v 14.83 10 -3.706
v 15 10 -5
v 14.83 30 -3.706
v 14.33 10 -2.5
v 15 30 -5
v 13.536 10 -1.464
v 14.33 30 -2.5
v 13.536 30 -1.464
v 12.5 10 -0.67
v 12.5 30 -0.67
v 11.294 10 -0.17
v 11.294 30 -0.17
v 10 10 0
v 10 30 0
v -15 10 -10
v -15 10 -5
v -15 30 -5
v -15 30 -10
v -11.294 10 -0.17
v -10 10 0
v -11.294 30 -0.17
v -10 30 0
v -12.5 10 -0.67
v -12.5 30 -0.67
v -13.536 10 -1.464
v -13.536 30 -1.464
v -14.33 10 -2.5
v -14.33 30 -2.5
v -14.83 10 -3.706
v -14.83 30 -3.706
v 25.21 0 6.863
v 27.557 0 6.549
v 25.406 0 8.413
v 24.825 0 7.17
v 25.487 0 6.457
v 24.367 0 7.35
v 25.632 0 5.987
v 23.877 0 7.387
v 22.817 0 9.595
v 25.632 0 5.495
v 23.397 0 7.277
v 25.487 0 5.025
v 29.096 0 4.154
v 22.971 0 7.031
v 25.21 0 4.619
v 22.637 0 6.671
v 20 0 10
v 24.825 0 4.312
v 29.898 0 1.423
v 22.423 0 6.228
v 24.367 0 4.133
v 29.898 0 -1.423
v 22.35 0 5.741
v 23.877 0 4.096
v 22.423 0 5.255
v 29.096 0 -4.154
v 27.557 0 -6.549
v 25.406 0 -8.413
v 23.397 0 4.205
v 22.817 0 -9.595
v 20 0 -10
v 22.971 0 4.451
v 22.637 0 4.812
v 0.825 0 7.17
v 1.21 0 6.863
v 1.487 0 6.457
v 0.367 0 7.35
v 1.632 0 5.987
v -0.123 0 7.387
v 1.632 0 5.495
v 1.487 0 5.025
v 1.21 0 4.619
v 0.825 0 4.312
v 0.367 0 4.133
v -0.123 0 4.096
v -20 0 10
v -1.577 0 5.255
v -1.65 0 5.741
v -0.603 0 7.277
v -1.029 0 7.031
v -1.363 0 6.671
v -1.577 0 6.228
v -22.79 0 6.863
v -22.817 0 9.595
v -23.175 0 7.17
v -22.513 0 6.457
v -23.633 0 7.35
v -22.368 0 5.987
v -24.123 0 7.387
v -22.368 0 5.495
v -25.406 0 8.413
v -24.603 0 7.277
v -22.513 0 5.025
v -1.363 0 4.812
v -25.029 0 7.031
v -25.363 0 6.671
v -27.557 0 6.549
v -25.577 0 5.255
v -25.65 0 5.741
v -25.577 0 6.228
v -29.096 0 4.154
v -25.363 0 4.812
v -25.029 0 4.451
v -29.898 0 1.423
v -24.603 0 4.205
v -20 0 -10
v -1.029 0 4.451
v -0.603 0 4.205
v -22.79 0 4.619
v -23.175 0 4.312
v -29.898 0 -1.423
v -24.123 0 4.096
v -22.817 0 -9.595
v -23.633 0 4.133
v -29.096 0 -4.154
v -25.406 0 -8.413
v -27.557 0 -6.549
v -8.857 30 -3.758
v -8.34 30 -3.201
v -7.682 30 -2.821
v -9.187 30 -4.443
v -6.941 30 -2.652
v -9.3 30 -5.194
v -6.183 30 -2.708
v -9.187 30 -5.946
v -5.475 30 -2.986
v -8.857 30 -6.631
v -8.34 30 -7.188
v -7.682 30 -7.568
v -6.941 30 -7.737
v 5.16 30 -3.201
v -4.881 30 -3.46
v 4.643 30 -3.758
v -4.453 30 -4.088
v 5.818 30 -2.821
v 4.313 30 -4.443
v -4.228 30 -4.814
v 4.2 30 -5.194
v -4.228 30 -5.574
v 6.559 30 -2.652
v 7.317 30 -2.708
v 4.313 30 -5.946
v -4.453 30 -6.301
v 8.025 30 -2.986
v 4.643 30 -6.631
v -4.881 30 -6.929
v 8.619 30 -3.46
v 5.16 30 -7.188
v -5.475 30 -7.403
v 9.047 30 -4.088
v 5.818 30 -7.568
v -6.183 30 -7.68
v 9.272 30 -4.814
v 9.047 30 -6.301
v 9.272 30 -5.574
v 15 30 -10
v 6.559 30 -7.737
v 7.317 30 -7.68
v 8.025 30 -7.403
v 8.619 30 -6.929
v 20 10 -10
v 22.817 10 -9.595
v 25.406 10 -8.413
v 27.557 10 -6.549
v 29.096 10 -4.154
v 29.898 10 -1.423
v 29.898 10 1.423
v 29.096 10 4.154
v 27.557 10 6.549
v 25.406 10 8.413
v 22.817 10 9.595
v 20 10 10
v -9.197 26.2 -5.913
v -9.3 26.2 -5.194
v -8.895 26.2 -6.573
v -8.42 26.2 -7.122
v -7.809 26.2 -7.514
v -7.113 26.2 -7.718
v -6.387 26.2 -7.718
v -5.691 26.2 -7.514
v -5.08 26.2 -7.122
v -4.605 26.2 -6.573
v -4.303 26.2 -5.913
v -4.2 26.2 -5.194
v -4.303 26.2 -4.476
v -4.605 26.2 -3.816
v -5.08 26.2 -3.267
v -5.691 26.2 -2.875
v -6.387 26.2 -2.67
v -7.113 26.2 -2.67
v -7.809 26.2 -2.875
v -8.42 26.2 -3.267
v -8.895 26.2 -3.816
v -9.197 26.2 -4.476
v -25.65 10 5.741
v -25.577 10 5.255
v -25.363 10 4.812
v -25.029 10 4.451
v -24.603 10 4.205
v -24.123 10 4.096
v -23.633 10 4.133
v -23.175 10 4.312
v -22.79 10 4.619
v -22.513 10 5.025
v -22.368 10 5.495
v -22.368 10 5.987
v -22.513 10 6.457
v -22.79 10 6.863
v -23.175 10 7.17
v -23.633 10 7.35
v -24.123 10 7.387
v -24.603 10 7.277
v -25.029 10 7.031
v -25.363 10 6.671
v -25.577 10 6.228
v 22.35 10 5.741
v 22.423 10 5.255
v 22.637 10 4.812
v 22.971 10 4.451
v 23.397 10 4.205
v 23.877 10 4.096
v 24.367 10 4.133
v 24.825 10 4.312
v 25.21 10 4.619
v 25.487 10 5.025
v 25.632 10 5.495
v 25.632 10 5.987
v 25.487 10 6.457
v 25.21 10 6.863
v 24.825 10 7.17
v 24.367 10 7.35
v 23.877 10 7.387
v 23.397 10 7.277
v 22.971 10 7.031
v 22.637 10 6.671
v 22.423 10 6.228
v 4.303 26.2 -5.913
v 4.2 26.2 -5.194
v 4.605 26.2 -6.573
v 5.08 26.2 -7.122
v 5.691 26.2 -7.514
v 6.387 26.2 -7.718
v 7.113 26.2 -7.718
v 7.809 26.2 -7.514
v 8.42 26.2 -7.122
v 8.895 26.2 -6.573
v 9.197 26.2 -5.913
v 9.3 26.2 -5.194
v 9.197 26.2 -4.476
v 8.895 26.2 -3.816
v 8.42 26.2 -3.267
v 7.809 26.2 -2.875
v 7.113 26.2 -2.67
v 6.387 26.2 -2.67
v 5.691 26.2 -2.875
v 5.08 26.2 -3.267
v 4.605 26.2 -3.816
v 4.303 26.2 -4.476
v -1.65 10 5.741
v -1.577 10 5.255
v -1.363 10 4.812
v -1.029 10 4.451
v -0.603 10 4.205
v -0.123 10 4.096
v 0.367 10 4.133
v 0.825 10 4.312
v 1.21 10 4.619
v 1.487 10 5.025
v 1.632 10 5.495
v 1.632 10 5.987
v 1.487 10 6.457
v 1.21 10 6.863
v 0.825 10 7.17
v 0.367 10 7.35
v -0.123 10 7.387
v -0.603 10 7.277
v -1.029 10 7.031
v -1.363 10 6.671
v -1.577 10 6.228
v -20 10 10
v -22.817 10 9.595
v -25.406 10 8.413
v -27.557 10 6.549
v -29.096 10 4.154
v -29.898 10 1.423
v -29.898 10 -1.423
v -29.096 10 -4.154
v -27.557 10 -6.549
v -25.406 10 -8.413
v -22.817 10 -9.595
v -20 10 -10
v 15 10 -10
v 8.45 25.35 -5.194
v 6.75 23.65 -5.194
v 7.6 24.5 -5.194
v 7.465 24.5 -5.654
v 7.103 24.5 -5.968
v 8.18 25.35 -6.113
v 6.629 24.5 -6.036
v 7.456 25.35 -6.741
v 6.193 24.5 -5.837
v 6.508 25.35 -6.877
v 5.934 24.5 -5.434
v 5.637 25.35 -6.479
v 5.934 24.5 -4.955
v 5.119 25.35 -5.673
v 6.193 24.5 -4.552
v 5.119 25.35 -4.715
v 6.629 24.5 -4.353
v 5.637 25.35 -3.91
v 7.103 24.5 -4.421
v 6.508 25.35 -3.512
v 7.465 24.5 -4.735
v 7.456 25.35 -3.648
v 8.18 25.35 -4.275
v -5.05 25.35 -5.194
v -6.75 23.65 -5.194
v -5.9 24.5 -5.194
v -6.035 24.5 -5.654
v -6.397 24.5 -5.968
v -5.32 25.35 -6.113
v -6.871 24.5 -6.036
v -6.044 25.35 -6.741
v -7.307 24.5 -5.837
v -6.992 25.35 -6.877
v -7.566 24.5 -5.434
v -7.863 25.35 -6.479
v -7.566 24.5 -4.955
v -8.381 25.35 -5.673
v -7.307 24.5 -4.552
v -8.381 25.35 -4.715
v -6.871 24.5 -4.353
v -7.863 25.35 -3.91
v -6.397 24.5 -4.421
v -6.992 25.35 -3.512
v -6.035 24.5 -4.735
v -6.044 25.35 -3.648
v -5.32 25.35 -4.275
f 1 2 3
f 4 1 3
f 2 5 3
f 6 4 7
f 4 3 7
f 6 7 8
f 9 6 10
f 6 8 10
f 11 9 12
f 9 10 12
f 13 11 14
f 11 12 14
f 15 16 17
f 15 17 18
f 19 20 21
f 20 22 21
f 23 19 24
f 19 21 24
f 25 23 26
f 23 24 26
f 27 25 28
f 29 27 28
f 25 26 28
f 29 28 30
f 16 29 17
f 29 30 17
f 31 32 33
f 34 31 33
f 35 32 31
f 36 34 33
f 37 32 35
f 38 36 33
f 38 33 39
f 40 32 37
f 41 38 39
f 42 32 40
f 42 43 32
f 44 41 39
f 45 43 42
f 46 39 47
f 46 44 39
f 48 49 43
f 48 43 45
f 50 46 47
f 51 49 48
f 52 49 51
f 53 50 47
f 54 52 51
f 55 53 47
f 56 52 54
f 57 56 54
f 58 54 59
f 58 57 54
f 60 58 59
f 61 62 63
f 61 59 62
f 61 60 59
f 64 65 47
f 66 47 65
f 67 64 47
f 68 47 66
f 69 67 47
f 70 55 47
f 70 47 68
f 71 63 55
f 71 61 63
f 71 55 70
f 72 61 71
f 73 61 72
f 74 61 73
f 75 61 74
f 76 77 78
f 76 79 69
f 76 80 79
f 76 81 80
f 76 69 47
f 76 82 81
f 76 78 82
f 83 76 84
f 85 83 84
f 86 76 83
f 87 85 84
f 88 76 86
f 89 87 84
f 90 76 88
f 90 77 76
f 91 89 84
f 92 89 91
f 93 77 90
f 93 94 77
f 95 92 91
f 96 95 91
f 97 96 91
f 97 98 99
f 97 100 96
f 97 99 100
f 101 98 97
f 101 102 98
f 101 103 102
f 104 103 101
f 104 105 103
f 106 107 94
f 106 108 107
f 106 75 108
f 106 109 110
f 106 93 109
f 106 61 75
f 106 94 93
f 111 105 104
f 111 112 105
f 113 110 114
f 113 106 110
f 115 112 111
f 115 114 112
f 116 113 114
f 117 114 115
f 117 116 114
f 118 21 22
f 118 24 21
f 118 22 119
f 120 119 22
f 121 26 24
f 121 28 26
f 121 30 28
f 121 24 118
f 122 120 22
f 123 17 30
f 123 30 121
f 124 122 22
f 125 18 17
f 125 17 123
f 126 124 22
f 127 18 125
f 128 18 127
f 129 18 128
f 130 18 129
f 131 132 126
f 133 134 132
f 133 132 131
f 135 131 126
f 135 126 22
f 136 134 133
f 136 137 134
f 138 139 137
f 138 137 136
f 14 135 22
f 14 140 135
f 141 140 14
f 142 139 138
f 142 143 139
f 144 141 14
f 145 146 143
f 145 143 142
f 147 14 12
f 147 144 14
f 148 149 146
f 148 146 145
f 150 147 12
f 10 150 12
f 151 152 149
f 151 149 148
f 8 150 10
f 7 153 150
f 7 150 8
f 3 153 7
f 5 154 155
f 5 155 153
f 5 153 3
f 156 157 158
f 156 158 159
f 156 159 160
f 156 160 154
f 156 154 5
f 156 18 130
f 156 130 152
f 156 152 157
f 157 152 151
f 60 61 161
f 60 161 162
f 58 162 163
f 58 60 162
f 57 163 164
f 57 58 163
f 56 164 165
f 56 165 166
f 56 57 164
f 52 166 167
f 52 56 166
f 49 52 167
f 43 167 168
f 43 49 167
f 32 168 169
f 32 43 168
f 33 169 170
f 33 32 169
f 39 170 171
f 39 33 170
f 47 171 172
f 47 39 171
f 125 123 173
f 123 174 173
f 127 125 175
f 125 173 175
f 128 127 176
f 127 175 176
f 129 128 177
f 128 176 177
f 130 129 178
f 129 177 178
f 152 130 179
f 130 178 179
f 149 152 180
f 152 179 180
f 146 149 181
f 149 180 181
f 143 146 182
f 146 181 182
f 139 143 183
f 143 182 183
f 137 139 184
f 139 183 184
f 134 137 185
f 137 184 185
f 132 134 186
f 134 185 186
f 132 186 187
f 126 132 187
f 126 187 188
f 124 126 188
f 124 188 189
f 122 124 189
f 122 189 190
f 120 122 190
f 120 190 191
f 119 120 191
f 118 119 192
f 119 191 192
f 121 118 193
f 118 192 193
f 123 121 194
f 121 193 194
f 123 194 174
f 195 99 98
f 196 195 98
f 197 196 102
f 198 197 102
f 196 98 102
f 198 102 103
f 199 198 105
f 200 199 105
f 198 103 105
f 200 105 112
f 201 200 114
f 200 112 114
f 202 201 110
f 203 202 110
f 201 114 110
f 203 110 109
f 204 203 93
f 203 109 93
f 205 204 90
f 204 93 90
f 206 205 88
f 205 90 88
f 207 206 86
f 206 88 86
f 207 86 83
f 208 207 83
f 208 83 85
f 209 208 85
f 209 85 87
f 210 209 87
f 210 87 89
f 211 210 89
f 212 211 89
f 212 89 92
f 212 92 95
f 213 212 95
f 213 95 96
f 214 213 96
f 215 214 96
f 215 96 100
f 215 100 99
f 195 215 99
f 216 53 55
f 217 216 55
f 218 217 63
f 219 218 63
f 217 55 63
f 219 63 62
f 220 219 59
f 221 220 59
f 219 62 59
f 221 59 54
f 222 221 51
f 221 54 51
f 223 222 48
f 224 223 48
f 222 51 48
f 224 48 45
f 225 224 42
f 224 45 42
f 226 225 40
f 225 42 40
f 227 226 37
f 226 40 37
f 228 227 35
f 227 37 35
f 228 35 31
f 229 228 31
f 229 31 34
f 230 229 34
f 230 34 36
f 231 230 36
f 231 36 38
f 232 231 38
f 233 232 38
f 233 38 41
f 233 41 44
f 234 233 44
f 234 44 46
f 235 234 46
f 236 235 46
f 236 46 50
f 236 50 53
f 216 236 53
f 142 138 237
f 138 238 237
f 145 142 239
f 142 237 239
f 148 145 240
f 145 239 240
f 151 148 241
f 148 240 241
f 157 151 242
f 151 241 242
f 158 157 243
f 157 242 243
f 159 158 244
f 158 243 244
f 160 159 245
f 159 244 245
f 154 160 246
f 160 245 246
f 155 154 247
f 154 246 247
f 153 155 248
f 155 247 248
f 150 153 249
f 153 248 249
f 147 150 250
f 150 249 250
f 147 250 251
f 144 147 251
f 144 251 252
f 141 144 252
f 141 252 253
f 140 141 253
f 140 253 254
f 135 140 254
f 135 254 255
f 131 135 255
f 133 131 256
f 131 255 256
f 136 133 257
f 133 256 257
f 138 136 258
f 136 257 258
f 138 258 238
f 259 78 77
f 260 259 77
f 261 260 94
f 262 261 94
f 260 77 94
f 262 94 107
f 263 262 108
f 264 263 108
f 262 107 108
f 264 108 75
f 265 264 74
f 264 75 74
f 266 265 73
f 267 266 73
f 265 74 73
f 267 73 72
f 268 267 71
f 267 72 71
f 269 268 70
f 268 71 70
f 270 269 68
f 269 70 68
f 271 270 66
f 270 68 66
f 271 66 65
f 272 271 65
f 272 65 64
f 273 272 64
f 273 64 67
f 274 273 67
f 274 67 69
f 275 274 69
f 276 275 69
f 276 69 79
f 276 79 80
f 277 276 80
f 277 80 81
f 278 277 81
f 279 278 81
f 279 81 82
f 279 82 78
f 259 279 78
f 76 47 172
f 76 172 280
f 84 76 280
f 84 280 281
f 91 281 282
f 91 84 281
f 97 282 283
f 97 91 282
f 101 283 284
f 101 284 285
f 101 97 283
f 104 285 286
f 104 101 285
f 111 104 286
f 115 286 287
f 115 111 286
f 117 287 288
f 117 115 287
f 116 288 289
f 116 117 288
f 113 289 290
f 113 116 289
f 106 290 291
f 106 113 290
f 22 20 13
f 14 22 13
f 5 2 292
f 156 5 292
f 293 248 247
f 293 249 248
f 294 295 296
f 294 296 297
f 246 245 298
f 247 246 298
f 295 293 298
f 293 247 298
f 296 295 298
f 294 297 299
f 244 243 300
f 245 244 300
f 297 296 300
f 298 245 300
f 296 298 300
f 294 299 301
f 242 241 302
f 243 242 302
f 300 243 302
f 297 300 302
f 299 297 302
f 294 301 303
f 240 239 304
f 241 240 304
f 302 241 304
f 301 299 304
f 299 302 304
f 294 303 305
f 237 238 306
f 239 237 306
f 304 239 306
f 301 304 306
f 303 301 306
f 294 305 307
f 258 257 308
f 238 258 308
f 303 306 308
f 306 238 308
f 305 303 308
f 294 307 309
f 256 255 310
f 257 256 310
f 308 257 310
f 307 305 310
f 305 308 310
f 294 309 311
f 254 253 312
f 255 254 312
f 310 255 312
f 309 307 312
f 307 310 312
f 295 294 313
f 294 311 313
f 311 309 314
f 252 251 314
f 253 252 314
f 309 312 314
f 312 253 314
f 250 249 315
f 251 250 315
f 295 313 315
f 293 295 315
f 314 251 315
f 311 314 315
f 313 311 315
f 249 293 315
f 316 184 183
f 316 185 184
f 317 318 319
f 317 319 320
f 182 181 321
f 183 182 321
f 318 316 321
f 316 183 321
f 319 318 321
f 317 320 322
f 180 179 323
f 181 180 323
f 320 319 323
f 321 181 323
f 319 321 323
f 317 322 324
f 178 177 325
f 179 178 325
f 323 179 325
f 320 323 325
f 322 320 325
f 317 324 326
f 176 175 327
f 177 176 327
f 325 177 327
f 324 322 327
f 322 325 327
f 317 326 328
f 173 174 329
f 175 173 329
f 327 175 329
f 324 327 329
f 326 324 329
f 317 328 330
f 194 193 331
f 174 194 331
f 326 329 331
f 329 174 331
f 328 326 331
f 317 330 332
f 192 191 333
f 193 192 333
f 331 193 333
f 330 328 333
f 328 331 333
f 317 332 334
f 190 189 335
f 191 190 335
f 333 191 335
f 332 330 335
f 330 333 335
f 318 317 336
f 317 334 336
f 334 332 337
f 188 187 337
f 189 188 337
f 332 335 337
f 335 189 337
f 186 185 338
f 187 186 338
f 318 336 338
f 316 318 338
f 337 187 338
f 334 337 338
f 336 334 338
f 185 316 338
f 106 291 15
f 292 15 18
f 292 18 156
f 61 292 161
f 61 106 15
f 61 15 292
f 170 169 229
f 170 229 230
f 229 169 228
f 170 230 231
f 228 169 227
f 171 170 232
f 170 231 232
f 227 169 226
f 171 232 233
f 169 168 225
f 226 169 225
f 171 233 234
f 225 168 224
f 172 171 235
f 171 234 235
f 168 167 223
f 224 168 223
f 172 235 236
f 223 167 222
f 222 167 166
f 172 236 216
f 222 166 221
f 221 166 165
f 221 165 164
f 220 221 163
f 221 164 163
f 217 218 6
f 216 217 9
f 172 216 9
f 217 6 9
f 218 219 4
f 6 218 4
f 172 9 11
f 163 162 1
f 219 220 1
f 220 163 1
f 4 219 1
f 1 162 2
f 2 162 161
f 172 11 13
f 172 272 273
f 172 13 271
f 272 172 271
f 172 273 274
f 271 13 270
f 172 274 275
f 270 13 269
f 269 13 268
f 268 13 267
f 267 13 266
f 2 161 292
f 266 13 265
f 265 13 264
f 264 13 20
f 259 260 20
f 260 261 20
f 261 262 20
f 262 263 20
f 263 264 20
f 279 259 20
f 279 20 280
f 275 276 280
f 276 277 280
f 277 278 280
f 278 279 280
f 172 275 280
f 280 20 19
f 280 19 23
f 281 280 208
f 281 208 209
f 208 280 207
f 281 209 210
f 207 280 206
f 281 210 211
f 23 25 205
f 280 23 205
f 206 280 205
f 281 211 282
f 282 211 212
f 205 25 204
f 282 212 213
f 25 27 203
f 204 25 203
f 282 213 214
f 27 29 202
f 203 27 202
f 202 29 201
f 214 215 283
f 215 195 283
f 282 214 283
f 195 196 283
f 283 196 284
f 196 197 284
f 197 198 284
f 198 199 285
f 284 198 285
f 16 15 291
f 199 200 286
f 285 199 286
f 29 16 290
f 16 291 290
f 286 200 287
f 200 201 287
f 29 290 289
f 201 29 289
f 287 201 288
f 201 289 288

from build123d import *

# Parameters (mm, degrees)
BOSS_EXTRUDE1_DEPTH         = 10
TAP_DRILL_FOR_M4X0_7_TAP1_D = 3.3
SKETCH8_W                   = 30
SKETCH8_H                   = 10
BOSS_EXTRUDE2_DEPTH         = 20
FILLET1_R                   = 5
F_1_0MM_DOWEL_HOLE1_D       = 5.1
F_1_0MM_DOWEL_HOLE1_DEPTH   = 3.8
F_1_0MM_DOWEL_HOLE1_TIP     = 2.55


with BuildPart() as part:
    # Sketch3 → Boss-Extrude1 (new body)
    with BuildSketch(Plane(origin=(0, 0, 0), x_dir=(1, 0, 0), z_dir=(0, 1, 0))):
        with BuildLine():
            Line((-20, 10), (20, 10))
            ThreePointArc((20, 10), (30, 0), (20, -10))
            Line((20, -10), (-20, -10))
            ThreePointArc((-20, -10), (-30, 0), (-20, 10))
        make_face()
    extrude(amount=BOSS_EXTRUDE1_DEPTH)

    # Tap Drill for M4x0.7 Tap1 (through all)
    with Locations(Plane(origin=(0, 10, 0), x_dir=(1, 0, 0), z_dir=(0, 1, 0))):
        with Locations((0, -5.741156808), (24, -5.741156808), (-24, -5.741156808)):
            Hole(TAP_DRILL_FOR_M4X0_7_TAP1_D / 2)

    # Sketch8 → Boss-Extrude2 (add)
    with BuildSketch(Plane(origin=(0, 10, 0), x_dir=(1, 0, 0), z_dir=(0, 1, 0))):
        with Locations((0, 5)):
            Rectangle(SKETCH8_W, SKETCH8_H)
    extrude(amount=BOSS_EXTRUDE2_DEPTH)

    # Fillet1
    fillet1_edges = [part.edges().sort_by_distance(p)[0] for p in [
        (-15, 20, 0),
        (15, 20, 0),
    ]]
    fillet(fillet1_edges, radius=FILLET1_R)

    # Ø1.0mm Dowel Hole1
    with Locations(Plane(origin=(0, 30, 0), x_dir=(1, 0, 0), z_dir=(0, 1, 0))):
        with Locations((-6.75, 5.194379969), (6.75, 5.194379969)):
            Hole(F_1_0MM_DOWEL_HOLE1_D / 2, depth=F_1_0MM_DOWEL_HOLE1_DEPTH)
            with Locations((0, 0, -(F_1_0MM_DOWEL_HOLE1_DEPTH + F_1_0MM_DOWEL_HOLE1_TIP / 2))):  # 90° drill point
                Cone(0, F_1_0MM_DOWEL_HOLE1_D / 2, F_1_0MM_DOWEL_HOLE1_TIP, mode=Mode.SUBTRACT)


solid = part.part
